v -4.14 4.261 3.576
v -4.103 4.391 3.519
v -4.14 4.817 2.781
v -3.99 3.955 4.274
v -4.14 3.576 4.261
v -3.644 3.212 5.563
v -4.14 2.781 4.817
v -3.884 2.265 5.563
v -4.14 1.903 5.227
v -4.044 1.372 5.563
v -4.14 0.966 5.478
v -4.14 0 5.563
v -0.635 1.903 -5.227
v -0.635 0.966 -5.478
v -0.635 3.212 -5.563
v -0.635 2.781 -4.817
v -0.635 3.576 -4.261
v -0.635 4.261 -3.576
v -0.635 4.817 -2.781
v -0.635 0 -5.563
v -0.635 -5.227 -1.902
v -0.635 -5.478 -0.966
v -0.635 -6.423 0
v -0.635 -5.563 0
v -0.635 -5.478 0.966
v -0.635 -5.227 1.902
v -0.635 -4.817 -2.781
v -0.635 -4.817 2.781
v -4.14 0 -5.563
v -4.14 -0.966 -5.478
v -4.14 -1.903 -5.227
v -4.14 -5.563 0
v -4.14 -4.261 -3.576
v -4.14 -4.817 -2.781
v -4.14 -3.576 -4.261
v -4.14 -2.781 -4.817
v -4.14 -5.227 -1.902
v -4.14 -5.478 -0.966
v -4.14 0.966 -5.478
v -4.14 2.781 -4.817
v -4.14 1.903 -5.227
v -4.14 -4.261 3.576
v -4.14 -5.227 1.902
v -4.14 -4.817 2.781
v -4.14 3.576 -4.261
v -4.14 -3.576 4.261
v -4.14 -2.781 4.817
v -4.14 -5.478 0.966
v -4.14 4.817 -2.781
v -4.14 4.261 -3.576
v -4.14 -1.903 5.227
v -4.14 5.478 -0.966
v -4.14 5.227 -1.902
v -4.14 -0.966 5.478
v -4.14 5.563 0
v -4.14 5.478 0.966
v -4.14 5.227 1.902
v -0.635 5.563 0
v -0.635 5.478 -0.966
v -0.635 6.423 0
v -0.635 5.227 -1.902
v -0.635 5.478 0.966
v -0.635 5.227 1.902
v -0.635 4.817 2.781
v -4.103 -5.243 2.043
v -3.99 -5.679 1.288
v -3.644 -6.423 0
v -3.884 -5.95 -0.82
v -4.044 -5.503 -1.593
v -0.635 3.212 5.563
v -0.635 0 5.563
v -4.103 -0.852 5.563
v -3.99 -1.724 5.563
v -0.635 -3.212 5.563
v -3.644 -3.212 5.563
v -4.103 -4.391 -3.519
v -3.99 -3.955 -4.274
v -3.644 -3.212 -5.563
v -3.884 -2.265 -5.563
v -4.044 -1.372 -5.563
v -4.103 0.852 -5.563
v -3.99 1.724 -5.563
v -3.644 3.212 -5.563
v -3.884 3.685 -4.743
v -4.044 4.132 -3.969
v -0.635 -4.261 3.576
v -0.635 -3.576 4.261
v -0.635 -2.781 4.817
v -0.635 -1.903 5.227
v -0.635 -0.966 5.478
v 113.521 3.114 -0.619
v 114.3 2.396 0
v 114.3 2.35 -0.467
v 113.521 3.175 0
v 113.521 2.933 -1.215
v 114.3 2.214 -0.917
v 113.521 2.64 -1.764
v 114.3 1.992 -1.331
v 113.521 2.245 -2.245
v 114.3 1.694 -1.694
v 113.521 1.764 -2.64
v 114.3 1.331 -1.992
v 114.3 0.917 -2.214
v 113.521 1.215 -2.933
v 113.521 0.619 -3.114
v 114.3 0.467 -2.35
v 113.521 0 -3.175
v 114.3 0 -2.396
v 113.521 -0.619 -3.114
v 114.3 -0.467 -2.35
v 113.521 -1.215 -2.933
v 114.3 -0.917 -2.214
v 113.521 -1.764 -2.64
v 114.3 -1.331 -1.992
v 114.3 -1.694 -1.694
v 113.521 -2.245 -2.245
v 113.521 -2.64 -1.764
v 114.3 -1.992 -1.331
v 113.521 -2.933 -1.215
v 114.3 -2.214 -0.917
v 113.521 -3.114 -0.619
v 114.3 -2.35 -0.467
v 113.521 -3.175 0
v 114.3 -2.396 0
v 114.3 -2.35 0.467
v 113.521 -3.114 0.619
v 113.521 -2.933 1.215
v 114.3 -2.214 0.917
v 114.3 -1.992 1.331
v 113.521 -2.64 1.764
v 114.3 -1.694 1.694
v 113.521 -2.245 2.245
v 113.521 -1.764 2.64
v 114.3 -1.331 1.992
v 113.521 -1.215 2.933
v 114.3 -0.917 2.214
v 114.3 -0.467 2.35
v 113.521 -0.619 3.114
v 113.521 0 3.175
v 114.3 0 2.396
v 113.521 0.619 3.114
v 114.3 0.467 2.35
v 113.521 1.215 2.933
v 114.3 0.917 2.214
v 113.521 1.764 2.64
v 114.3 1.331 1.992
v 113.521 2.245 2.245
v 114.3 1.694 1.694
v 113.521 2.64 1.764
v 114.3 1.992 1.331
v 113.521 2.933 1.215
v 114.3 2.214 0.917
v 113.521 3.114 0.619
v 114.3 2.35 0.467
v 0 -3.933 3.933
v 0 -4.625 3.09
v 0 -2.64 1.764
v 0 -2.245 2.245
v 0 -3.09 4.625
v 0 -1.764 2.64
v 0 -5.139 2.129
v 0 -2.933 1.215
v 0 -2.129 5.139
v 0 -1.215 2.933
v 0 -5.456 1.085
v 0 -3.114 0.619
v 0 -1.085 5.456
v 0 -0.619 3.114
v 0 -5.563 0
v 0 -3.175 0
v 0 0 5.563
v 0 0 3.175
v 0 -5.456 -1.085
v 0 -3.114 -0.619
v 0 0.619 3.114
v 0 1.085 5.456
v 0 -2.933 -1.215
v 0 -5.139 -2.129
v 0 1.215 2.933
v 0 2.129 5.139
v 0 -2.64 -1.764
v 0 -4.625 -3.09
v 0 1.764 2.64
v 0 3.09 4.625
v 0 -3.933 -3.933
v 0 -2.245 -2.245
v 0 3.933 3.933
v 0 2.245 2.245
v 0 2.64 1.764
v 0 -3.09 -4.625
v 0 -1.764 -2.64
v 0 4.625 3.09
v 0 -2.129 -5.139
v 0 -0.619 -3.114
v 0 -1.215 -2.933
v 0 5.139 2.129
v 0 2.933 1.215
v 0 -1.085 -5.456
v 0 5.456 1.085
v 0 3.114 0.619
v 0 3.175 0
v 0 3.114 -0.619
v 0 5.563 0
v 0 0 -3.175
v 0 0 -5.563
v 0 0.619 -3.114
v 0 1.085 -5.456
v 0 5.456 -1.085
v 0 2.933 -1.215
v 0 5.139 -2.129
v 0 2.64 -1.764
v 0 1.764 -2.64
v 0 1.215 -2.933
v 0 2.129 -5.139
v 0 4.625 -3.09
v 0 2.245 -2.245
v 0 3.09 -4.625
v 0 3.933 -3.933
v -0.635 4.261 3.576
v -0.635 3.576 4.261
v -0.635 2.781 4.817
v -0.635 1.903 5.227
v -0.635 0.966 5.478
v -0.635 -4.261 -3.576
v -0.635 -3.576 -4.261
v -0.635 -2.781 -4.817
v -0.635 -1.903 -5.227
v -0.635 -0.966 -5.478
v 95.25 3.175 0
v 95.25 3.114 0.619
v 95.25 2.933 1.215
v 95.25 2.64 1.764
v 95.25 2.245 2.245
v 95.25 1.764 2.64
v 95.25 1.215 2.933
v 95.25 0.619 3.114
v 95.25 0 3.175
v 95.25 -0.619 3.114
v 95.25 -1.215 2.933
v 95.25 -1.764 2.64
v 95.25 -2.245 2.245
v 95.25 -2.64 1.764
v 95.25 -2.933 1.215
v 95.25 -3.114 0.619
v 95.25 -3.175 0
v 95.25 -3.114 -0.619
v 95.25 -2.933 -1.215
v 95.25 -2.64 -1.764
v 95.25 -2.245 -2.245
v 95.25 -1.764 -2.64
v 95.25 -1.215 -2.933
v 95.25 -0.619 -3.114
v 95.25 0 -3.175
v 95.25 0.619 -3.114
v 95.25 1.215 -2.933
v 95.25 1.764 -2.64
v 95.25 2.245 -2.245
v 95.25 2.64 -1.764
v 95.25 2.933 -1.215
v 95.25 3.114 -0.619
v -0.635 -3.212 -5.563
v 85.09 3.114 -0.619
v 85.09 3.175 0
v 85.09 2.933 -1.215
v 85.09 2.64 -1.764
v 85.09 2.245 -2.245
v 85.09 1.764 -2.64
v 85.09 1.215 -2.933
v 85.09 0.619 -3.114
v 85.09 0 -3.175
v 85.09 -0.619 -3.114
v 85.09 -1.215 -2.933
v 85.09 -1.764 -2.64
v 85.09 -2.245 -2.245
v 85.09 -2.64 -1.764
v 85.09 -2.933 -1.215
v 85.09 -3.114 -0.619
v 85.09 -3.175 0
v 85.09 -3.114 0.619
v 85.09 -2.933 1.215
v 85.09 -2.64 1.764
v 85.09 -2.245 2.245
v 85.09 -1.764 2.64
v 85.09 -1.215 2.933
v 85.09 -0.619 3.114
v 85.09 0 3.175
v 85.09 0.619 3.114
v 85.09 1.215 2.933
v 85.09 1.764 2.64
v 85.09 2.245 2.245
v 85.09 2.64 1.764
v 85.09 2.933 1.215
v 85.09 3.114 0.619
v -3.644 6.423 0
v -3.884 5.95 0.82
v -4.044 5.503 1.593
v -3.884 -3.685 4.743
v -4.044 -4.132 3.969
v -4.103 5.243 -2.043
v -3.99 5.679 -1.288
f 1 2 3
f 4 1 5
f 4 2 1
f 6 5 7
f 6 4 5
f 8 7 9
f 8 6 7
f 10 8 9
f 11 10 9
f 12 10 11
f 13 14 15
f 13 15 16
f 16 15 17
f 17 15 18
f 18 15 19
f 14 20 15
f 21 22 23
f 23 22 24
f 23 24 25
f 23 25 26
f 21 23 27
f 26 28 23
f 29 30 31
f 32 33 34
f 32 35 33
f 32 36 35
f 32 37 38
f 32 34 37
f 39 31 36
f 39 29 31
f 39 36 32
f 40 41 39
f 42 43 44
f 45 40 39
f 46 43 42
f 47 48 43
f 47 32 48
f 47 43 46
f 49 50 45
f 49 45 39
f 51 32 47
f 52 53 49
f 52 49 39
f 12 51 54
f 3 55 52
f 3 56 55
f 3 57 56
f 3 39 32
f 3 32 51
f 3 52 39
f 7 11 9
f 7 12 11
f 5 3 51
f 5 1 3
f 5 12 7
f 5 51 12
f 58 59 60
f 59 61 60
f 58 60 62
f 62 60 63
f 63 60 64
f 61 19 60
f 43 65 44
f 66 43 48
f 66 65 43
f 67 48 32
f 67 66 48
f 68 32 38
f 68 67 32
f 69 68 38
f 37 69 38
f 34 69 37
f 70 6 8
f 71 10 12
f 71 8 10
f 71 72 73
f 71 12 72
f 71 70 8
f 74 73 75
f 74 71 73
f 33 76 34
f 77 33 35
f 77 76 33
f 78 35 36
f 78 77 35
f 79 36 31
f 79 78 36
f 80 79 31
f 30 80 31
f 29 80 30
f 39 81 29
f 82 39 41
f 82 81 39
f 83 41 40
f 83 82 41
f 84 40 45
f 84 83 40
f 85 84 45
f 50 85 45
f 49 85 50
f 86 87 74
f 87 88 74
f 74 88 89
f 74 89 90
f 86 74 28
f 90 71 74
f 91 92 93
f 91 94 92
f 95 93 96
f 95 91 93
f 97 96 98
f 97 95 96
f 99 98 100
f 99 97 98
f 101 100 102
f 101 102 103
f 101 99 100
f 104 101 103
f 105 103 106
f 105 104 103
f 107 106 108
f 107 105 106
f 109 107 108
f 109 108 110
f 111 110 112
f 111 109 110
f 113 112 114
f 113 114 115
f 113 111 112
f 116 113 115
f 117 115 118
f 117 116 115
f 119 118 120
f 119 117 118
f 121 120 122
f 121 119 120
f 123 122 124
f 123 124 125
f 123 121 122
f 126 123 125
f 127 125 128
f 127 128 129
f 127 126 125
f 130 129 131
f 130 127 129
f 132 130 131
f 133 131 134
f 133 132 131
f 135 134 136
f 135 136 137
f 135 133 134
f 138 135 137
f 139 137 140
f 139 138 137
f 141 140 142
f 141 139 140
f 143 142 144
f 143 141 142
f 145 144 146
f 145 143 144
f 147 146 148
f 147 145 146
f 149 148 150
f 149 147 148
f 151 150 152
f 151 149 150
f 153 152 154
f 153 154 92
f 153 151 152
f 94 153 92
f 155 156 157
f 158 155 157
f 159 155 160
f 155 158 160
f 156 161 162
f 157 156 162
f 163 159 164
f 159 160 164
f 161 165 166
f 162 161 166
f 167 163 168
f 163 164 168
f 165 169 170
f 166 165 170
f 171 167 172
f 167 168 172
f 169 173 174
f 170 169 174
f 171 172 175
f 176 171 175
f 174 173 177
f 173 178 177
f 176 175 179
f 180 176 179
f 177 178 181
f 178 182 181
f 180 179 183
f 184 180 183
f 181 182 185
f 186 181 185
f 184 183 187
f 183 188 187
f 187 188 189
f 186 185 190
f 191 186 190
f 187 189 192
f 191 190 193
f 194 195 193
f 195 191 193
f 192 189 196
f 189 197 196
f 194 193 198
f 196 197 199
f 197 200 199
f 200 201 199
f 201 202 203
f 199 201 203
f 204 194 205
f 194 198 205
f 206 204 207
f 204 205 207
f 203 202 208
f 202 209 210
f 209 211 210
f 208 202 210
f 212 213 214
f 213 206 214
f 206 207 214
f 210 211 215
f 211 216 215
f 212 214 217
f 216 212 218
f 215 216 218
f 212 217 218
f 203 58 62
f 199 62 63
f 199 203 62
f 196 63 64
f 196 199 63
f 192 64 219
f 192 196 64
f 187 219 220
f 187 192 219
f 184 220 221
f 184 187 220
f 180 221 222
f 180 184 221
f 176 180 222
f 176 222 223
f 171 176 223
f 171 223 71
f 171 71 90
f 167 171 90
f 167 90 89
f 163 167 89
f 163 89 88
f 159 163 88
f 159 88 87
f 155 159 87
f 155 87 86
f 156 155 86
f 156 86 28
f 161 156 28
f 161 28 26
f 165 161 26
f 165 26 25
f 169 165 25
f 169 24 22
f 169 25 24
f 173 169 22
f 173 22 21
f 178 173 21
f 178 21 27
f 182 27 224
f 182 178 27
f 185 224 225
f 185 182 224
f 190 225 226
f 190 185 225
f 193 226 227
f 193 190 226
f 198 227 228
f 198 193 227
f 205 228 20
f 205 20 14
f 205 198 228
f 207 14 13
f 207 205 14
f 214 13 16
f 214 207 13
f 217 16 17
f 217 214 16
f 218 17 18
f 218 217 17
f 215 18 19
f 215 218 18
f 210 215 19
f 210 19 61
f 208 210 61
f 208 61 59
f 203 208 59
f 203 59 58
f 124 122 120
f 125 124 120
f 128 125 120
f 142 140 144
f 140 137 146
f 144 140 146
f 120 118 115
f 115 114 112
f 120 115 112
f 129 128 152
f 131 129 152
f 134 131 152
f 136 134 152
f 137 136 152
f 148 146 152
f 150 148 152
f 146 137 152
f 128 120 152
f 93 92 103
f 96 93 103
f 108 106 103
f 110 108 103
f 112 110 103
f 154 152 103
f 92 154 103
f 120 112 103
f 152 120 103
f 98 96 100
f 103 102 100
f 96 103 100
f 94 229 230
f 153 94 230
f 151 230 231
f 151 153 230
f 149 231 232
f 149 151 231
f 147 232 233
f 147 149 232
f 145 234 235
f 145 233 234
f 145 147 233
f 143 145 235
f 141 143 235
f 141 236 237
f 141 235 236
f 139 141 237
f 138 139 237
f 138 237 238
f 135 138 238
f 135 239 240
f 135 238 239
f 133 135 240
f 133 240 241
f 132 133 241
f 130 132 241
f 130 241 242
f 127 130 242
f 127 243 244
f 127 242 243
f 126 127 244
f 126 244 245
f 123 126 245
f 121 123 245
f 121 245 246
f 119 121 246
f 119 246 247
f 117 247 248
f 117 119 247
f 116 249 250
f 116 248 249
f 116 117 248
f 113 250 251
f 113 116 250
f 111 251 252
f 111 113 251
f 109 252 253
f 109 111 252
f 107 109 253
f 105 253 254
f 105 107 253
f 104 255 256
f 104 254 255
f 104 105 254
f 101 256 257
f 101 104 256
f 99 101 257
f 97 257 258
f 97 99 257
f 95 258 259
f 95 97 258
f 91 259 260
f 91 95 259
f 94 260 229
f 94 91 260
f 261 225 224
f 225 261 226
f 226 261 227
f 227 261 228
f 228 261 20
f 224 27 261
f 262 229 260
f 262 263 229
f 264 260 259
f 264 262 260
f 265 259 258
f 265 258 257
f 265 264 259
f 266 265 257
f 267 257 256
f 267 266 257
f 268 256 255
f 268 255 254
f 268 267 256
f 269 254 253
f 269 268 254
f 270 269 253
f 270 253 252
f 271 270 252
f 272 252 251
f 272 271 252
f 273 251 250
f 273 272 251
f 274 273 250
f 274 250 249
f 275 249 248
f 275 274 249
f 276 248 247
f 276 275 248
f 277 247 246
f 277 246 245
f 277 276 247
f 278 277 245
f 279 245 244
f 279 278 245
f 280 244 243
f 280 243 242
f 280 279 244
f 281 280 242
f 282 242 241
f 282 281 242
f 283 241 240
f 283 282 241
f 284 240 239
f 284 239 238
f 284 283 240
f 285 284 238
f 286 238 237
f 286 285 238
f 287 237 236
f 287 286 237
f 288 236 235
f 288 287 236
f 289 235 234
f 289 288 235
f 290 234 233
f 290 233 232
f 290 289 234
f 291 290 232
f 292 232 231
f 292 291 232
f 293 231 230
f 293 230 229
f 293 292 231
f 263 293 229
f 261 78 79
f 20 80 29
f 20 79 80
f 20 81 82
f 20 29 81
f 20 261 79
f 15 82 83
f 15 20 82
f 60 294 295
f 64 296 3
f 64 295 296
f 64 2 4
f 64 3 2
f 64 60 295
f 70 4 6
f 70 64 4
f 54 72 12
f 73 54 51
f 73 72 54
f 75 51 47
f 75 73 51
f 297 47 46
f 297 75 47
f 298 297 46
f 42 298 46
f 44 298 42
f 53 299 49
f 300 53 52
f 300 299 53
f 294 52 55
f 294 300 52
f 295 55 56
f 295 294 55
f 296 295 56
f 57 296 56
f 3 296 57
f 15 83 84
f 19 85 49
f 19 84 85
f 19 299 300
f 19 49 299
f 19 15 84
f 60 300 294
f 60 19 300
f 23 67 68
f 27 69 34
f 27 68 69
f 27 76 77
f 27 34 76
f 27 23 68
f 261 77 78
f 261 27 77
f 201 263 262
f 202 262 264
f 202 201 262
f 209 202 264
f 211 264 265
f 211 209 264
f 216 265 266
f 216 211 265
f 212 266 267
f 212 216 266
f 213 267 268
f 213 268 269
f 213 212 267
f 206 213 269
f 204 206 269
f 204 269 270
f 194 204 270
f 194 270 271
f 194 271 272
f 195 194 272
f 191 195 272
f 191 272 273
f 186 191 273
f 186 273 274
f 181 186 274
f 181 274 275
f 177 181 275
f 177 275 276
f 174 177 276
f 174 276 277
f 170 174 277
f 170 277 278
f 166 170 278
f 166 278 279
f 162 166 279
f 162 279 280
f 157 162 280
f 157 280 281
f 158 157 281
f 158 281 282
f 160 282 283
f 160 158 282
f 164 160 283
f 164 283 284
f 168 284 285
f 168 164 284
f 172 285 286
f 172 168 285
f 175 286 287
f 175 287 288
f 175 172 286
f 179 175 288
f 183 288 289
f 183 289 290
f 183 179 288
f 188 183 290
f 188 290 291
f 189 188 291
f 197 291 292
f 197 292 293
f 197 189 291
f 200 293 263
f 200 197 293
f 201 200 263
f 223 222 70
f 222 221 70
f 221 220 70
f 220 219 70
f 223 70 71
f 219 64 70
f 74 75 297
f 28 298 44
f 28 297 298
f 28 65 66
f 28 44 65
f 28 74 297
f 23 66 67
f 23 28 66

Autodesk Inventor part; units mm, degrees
ref_plane "YZ Plane" through (0, 0, 0) normal (1, 0, 0) x (0, 1, 0)
ref_plane "XZ Plane" through (0, 0, 0) normal (0, 1, 0) x (-1, 0, 0)
sketch "Sketch1" plane through (0, 0, 0) normal (0, 0, 1) x (1, 0, 0)
  line L0 (0, 5.5626) -> (0, 3.175)
  line L1 (95.25, 3.175) -> (114.3, 3.175)
  line L2 (114.3, 3.175) -> (114.3, 0)
  line L3 (114.3, 0) -> (-0.6351, 0)
  line L4 (-23.6221, 0) -> (137.287, 0) projected
  line L5 (-0.6351, 0) -> (-0.6351, 5.5626)
  line L6 (-0.6351, 5.5626) -> (0, 5.5626)
  line L7 (95.25, 3.175) -> (85.0899, 3.175)
  line L8 (85.0899, 3.175) -> (0, 3.175)
  line L9 (0, -1.1125) -> (0, 6.6751) projected
  dimension "d0" = 114.3
  dimension "d1" = 19.05
  dimension "d2" = 6.35
  dimension "d9" = 0.6351
  dimension "d10" = 11.1252
  dimension "d13" = 10.1601
  dimension "d14" = 6.35
revolve "Body" add sketch "Sketch1" angle 360 about axis through (114.3, 0, 0) along (-1, 0, 0)
sketch "Sketch2" plane through (-0.6351, 0, 0) normal (-1, 0, 0) x (0, 0, 1)
  line L0 (0, 6.4231) -> (5.5626, 3.2116)
  line L1 (5.5626, 3.2116) -> (5.5626, -3.2116)
  line L2 (5.5626, -3.2116) -> (0, -6.4231)
  line L3 (0, -6.4231) -> (-5.5626, -3.2116)
  line L4 (-5.5626, -3.2116) -> (-5.5626, 3.2116)
  line L5 (-5.5626, 3.2116) -> (0, 6.4231)
  point P0 (0, 0)
  point P1 (0, 0)
  dimension "d11" = 11.1252
extrude "Head" add sketch "Sketch2" along normal blind 3.5052
sketch "Sketch4" plane through (0, 0, 0) normal (0, 0, 1) x (1, 0, 0)
  line L0 (-4.1403, 5.5626) -> (-4.1403, 6.4231)
  line L1 (-4.1403, 6.4231) -> (-3.6435, 6.4231)
  line L2 (-3.6435, 6.4231) -> (-4.1403, 5.5626)
  line L3 (-4.8413, 0) -> (0.0659, 0) projected
  line L4 (-0.6351, 6.4231) -> (-4.1403, 6.4231) projected
  line L5 (-4.1403, 3.2116) -> (-4.1403, 6.4231) projected
  dimension "d5" = 30
  dimension "d19" = 11.1252
revolve "Chamfer1" cut sketch "Sketch4" angle 360 about axis through (-10, 0, 0) along (1, 0, 0)
thread "Thread" size "1/4-20 UNC" class "2A" standard "ANSI Unified Screw Threads" length 19.05
chamfer "Chamfer2" distance 0.779 distance2 0.7791 1 edges at (114.3, -3.175, 0) measured on face at (114.3, 0.6107, -1.4381)
ref_plane "Work Plane1" through (1.525, 0, 0) normal (0, 0, 1) x (1, 0, 0)
equation "\"d0\" = NLG"
equation "\"d1\" = GEL"
equation "\"d2\" = GD"
equation "\"d10\" = SD2"
equation "\"d14\" = BDM"
equation "\"d11\" = SW"
equation "\"d3\" = KOH - SD"
equation "\"d5\" = ANG1"
equation "\"d19\" = SW0"
equation "\"d15\" = GEL"
equation "\"d6\" = -0.5 * SPD + 0.5 * GD"
equation "\"NLG\" = 114.3"
equation "\"GD\" = 6.35"
equation "\"BDM\" = 6.35"
equation "\"KOH\" = 4.1402"
equation "\"GEL\" = 19.05"
equation "\"SW\" = 11.1252"
equation "\"SW0\" = SW"
equation "\"SPD\" = GD1"
equation "\"SD2\" = SW"
equation "\"SD\" = 0.635"
equation "\"ANG1\" = 30deg"
equation "\"GAL\" = 10.16"
equation "\"GUL\" = 0.77902"
equation "\"RR\" = 0.381"
equation "\"WFT\" = SD"
equation "\"GD1\" = 4.79196"
equation "\"THREADDIA\" = 6.35"
equation "\"SDH\" = SW"
equation "\"SDHG\" = 85.09"
equation "\"TOA\" = 30deg"
equation "\"FAWI\" = 45deg"
equation "\"NND\" = 6.35"
equation "\"E0\" = 12.84961"
properties part number "AS 2465 - 1/4 x 4 1/2  UNC" material "Steel, Mild"
